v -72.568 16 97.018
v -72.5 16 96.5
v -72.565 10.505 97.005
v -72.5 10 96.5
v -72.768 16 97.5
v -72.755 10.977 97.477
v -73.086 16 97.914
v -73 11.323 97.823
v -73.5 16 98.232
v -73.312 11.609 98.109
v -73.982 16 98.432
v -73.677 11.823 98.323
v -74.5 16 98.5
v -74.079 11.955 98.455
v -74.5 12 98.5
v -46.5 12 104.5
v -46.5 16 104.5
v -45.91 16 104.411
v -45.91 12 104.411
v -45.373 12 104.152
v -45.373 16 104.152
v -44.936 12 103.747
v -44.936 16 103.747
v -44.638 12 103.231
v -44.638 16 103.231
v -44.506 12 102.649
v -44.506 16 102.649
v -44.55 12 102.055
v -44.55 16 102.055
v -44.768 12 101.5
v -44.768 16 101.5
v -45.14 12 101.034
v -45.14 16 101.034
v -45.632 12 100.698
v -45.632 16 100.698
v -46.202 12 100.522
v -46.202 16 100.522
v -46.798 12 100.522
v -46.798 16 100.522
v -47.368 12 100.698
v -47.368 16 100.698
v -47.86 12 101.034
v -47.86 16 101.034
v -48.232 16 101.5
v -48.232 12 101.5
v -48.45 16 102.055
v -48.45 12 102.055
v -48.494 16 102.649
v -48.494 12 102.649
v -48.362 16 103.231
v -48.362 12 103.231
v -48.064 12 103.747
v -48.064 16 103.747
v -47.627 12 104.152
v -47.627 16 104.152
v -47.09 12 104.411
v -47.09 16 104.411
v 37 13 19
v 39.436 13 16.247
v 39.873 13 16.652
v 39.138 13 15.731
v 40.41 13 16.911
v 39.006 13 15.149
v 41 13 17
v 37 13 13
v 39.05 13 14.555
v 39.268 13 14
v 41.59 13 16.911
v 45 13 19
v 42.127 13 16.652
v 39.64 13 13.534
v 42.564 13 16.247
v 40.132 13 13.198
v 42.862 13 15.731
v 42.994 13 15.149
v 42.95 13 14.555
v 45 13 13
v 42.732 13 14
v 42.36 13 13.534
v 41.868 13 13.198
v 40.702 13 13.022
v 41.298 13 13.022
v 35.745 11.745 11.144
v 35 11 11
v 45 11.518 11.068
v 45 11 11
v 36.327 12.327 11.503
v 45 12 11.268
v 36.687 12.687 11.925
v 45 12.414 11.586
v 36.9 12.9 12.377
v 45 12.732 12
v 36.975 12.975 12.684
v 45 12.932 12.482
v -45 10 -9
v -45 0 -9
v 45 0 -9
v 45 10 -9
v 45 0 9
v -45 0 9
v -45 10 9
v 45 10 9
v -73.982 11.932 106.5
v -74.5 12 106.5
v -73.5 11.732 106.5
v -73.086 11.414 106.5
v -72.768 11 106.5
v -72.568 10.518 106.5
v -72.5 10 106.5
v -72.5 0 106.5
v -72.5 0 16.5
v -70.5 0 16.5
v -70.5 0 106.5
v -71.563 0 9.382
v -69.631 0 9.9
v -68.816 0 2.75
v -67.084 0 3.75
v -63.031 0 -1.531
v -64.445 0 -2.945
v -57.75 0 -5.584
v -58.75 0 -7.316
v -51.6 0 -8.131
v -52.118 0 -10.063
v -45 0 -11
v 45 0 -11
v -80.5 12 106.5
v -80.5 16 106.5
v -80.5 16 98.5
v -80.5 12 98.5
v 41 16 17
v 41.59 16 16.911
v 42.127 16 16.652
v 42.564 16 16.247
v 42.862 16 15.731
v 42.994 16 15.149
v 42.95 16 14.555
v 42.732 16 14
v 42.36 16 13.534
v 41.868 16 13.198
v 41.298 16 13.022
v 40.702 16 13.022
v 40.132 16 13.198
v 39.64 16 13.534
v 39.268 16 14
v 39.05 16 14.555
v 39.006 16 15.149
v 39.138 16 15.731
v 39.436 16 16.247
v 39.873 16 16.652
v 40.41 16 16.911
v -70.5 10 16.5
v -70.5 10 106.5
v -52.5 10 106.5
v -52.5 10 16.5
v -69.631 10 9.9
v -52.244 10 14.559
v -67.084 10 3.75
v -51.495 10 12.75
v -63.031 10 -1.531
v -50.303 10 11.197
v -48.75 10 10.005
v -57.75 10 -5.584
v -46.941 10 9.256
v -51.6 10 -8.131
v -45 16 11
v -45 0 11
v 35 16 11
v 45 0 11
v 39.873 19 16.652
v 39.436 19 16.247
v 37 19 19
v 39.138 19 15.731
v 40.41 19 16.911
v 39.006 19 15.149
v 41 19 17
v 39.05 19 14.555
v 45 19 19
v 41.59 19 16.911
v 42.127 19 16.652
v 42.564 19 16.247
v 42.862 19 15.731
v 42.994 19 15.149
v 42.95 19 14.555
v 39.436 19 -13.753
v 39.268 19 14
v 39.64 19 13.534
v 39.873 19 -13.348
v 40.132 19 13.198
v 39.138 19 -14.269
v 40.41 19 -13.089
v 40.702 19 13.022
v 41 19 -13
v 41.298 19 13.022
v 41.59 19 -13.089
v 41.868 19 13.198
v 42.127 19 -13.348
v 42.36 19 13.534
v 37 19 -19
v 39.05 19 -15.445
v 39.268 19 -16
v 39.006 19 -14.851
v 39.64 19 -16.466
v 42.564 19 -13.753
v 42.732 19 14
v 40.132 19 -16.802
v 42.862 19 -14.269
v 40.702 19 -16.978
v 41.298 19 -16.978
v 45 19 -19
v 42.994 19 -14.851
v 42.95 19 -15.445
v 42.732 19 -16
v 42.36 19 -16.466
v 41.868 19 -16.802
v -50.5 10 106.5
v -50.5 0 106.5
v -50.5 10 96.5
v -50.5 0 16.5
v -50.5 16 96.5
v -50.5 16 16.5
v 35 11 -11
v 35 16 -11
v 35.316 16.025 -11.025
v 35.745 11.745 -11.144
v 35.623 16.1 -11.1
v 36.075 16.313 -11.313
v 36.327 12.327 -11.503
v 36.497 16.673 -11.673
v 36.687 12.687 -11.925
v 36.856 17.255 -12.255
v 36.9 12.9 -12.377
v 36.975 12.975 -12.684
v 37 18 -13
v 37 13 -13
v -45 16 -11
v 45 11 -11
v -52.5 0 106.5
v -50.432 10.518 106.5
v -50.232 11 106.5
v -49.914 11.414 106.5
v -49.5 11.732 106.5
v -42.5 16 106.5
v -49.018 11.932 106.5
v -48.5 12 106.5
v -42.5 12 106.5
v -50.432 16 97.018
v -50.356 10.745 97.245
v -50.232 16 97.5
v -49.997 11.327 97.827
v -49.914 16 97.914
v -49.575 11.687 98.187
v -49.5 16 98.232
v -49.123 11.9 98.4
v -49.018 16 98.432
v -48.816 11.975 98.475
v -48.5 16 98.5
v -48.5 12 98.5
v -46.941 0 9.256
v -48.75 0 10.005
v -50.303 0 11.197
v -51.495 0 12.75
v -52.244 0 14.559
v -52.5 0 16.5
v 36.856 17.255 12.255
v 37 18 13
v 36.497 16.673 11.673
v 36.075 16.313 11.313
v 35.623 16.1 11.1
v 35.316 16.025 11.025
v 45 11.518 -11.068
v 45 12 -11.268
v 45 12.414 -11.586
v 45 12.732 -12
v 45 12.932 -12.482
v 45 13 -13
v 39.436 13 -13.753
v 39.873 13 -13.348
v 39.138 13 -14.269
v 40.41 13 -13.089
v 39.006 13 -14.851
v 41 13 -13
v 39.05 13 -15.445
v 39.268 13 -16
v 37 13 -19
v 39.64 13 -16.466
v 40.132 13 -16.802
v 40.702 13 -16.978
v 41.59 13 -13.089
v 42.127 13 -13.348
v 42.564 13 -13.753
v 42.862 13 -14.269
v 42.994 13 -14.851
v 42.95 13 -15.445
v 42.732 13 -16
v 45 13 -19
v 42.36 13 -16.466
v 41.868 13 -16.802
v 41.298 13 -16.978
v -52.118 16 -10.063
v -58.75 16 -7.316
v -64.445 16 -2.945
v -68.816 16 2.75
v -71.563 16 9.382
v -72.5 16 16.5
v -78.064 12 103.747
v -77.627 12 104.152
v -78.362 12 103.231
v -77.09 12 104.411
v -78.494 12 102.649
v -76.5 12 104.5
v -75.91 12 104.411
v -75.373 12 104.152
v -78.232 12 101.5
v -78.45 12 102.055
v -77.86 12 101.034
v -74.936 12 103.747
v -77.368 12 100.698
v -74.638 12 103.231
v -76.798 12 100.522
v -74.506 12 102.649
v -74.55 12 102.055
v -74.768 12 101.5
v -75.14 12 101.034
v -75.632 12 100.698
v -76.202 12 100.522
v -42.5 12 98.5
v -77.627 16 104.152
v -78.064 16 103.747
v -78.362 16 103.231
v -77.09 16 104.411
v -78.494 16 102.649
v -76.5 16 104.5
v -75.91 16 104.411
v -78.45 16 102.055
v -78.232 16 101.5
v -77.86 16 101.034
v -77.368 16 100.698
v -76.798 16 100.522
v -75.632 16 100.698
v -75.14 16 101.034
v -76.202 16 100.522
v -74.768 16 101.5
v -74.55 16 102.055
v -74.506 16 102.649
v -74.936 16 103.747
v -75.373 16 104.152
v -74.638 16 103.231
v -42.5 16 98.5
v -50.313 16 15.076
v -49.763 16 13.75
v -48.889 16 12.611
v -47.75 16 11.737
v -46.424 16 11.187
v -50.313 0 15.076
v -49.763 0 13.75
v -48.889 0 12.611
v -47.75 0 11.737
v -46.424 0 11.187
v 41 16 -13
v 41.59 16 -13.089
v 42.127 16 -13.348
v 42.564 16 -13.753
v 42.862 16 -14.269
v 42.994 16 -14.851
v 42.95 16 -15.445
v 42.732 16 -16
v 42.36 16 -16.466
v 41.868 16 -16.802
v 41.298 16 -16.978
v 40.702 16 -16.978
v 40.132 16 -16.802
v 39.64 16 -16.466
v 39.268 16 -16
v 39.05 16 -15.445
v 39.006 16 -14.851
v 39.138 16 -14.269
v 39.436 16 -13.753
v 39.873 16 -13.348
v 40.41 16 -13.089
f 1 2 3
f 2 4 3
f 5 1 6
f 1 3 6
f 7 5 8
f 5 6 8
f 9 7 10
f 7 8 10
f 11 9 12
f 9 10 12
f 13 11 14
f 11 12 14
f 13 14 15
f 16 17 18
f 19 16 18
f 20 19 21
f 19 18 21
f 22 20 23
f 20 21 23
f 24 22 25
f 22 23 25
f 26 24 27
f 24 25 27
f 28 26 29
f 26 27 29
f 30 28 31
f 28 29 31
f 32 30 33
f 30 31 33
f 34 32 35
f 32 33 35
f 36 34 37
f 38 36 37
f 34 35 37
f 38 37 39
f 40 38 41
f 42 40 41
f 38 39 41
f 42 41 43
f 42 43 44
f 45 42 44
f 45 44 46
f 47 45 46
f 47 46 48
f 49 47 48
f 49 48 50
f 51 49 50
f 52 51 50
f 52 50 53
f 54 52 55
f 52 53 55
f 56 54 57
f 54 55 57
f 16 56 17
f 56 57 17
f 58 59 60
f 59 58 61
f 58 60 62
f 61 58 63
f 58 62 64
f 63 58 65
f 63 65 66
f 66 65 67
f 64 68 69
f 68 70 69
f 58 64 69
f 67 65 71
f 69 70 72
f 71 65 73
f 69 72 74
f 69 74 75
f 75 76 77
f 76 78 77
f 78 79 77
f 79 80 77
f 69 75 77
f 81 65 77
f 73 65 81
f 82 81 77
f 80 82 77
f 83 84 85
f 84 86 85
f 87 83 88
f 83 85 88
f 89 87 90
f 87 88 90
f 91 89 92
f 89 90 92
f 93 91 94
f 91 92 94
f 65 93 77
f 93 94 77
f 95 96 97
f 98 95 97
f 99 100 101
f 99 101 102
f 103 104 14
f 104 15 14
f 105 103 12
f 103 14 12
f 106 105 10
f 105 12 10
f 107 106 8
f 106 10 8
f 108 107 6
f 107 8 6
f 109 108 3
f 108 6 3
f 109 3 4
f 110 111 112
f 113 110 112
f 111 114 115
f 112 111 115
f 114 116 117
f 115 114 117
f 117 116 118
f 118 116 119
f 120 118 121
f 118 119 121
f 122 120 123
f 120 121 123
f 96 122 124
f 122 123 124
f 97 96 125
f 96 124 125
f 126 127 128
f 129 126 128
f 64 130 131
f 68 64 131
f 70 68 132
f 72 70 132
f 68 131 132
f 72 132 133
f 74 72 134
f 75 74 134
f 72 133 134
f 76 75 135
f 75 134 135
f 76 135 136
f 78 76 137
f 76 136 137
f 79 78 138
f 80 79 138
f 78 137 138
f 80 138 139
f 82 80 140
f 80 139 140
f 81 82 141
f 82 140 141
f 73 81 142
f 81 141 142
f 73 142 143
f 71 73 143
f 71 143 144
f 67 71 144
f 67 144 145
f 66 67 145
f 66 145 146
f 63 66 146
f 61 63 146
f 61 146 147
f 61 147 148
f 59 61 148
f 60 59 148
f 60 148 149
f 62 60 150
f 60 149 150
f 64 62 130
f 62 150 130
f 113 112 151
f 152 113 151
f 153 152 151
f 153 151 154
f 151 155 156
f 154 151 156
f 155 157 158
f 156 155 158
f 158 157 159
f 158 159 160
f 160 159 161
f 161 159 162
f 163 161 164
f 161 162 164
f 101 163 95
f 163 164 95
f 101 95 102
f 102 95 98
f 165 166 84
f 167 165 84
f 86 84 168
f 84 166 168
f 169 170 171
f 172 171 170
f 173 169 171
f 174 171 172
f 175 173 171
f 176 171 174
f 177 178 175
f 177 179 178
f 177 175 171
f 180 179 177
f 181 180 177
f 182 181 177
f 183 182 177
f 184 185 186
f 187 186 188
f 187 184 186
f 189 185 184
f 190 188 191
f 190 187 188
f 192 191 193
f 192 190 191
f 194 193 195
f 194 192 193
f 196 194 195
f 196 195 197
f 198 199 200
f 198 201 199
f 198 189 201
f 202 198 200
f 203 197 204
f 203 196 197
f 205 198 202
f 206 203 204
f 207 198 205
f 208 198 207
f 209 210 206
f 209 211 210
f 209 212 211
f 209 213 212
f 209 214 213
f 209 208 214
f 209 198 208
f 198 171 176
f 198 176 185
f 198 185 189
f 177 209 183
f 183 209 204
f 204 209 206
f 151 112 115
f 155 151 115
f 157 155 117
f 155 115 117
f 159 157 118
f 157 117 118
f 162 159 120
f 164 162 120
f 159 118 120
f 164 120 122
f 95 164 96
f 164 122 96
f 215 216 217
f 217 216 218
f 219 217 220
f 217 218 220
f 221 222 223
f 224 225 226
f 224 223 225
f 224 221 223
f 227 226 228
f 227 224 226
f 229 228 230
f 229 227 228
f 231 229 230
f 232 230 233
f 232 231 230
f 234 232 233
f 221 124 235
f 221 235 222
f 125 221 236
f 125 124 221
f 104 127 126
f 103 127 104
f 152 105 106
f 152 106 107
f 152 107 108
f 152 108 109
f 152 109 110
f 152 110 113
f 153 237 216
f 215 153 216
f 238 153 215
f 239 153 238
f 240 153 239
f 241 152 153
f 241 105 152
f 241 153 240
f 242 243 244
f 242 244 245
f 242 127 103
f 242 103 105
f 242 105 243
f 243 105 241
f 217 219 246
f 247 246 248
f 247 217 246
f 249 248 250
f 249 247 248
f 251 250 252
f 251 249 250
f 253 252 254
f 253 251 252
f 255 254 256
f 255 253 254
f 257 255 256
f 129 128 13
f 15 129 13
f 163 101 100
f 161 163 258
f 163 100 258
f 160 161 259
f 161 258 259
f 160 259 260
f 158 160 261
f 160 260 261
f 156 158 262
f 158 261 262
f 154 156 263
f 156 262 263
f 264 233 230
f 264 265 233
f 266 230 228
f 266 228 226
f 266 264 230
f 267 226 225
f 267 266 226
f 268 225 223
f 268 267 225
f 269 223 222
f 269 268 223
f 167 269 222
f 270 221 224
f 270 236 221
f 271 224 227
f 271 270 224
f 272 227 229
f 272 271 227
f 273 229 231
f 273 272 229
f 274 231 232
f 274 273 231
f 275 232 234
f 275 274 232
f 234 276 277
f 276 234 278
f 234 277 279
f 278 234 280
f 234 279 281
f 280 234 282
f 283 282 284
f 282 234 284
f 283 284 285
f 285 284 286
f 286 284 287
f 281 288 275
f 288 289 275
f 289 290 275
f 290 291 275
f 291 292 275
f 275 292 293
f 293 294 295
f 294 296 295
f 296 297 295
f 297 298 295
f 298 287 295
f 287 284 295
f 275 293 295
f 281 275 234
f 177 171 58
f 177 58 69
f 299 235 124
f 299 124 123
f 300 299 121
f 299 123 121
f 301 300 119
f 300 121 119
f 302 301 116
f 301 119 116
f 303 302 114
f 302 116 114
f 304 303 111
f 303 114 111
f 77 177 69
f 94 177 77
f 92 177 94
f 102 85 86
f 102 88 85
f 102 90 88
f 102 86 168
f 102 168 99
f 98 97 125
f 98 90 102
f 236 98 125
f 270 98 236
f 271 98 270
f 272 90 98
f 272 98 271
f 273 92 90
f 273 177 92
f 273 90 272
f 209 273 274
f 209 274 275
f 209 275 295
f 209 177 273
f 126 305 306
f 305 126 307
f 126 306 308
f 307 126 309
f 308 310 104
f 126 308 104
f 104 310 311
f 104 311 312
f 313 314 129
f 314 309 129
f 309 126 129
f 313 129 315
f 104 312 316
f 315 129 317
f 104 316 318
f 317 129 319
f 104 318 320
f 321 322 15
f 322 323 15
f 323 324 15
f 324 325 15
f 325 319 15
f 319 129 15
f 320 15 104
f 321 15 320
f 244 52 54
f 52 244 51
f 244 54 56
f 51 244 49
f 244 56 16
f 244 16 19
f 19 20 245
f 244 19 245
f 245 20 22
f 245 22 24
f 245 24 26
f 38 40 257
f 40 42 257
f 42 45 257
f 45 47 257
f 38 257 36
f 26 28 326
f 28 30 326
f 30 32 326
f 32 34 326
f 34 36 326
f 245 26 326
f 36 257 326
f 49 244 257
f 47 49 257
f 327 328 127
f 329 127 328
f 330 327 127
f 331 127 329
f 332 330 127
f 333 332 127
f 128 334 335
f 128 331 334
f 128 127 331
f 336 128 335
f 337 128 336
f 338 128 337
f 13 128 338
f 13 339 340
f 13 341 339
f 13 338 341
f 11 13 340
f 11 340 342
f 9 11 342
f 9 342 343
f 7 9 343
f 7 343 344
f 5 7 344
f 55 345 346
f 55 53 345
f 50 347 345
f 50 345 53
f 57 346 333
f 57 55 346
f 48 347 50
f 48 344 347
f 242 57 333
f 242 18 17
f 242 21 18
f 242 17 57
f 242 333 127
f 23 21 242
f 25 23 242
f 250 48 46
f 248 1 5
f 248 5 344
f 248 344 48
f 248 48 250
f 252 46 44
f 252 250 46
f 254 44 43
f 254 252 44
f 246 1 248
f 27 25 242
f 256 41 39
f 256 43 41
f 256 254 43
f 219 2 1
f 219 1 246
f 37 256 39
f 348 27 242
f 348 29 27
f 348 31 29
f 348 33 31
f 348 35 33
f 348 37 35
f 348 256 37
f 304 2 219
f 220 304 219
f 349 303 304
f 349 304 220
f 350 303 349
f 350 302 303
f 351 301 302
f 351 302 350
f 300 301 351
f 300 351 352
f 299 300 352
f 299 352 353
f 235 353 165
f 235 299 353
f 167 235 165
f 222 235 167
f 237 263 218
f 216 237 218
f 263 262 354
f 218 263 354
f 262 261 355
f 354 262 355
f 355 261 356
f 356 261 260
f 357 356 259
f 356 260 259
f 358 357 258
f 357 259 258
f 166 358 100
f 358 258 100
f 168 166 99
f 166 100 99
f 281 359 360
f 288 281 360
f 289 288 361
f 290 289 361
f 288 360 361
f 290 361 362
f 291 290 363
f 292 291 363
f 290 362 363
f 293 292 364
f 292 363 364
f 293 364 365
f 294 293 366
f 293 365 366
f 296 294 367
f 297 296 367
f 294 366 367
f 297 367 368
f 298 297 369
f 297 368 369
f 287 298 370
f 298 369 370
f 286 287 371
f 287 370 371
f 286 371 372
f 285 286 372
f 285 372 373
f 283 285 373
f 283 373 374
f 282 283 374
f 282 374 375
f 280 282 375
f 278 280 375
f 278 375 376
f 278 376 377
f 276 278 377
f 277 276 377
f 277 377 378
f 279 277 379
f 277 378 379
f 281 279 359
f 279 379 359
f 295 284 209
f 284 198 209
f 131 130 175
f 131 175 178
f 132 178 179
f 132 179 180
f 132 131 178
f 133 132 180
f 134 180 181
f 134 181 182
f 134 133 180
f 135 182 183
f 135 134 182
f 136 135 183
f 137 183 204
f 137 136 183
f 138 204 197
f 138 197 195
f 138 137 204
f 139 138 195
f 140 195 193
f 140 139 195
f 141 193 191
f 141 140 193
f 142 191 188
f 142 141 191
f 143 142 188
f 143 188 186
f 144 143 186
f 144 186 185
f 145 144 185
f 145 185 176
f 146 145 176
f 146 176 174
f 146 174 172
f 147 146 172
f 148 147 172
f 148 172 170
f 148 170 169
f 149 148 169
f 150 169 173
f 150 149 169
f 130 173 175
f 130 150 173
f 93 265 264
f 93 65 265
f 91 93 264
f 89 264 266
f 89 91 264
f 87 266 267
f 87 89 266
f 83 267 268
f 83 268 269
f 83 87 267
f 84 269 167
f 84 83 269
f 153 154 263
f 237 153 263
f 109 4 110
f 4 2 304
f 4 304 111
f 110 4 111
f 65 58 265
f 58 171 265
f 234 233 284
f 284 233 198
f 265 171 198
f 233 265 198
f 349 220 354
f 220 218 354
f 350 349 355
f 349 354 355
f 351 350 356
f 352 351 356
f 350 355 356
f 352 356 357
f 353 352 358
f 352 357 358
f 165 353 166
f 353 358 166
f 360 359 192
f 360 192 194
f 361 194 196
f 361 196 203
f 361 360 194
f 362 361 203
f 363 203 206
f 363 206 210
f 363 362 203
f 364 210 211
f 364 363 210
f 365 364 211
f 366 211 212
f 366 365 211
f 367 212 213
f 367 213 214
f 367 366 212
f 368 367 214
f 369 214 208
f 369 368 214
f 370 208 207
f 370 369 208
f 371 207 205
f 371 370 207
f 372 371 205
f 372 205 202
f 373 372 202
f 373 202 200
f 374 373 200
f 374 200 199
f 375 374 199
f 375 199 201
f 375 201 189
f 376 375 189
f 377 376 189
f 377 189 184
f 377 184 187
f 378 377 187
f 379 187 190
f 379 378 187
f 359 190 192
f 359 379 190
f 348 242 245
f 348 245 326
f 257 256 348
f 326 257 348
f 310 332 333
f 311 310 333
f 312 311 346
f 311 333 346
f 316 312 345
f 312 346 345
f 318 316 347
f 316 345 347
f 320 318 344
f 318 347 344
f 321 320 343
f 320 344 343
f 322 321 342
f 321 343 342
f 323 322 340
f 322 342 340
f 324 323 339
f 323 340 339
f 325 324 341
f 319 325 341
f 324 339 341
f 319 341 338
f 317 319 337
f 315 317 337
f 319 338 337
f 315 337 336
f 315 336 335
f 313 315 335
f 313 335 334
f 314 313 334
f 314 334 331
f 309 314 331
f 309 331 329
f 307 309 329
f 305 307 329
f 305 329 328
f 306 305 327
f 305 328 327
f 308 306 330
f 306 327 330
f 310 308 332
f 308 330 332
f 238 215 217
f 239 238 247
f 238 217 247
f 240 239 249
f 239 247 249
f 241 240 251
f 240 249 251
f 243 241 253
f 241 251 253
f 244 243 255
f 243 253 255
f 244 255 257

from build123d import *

# Parameters (mm, degrees)
SKETCH1_W           = 90
SKETCH1_H           = 22
BOSS_EXTRUDE1_DEPTH = 16
SKETCH2_W           = 119.5
SKETCH2_H           = 18
CUT_EXTRUDE1_DEPTH  = 10
SWEEP5_START        = 10
SWEEP5_DEPTH        = 6
SWEEP5_2_DEPTH      = 10
BOSS_EXTRUDE2_DEPTH = 90
SKETCH12_W          = 8
SKETCH12_H          = 11
SKETCH12_H_2        = 8
SKETCH12_R          = 2
BOSS_EXTRUDE3_DEPTH = 3
SKETCH14_W          = 8
SKETCH14_H          = 8
SKETCH14_R          = 2
SKETCH14_W_2        = 11
BOSS_EXTRUDE4_DEPTH = 4
FILLET1_R           = 2


# Read off the part's stored shape, not the designer's step: Sweep5
with BuildPart() as part:
    # Sketch1 → Boss-Extrude1 (new body)
    with BuildSketch(Plane(origin=(0, 0, 0), x_dir=(1, 0, 0), z_dir=(0, 1, 0))):
        Rectangle(SKETCH1_W, SKETCH1_H)
    extrude(amount=BOSS_EXTRUDE1_DEPTH)

    # Sketch2 → Cut-Extrude1 (cut)
    with BuildSketch(Plane.XZ):
        Rectangle(SKETCH2_W, SKETCH2_H)
    extrude(amount=-CUT_EXTRUDE1_DEPTH, mode=Mode.SUBTRACT)

    # Sweep5 outline → Sweep5 (add)
    with BuildSketch(Plane(origin=(0, 0, 0), x_dir=(1, 0, 0), z_dir=(0, 1, 0)).offset(SWEEP5_START)):
        with BuildLine():
            ThreePointArc((-45, 11), (-64.445436483, 2.945436483), (-72.5, -16.5))
            Line((-72.5, -16.5), (-50.5, -16.5))
            ThreePointArc((-50.5, -16.5), (-48.889087297, -12.610912703), (-45, -11))
            Line((-45, -11), (-45, 11))
        make_face()
    extrude(amount=SWEEP5_DEPTH)

    # Sweep5 2 outline → Sweep5 2 (add)
    with BuildSketch(Plane(origin=(0, 0, 0), x_dir=(1, 0, 0), z_dir=(0, 1, 0))):
        with BuildLine():
            ThreePointArc((-45, 11), (-64.445436483, 2.945436483), (-72.5, -16.5))
            Line((-72.5, -16.5), (-70.5, -16.5))
            ThreePointArc((-70.5, -16.5), (-63.03122292, 1.53122292), (-45, 9))
            Line((-45, 9), (-45, 11))
        make_face()
        with BuildLine():
            ThreePointArc((-45, -9), (-50.303300859, -11.196699141), (-52.5, -16.5))
            Line((-52.5, -16.5), (-50.5, -16.5))
            ThreePointArc((-50.5, -16.5), (-48.889087297, -12.610912703), (-45, -11))
            Line((-45, -11), (-45, -9))
        make_face()
    extrude(amount=SWEEP5_2_DEPTH)

    # Sketch11 → Boss-Extrude2 (add)
    with BuildSketch(Plane.XY.offset(16.5)):
        Polygon((-72.5, 16), (-72.5, 0), (-70.5, 0), (-70.5, 10), (-52.5, 10), (-52.5, 0), (-50.5, 0), (-50.5, 16), align=None)
    extrude(amount=BOSS_EXTRUDE2_DEPTH)

    # Sketch12 → Boss-Extrude3 (add, symmetric)
    # profile 1 of 4: a face of its own
    with BuildSketch(Plane(origin=(0, 16, 0), x_dir=(1, 0, 0), z_dir=(0, 1, 0))):
        with Locations((41, 5.5)):
            Rectangle(SKETCH12_W, SKETCH12_H)
    # profile 2 of 4: a face of its own
    with BuildSketch(Plane(origin=(0, 16, 0), x_dir=(1, 0, 0), z_dir=(0, 1, 0))):
        with Locations((41, -5.5)):
            Rectangle(SKETCH12_W, SKETCH12_H)
    # profile 3 of 4: a face of its own
    with BuildSketch(Plane(origin=(0, 16, 0), x_dir=(1, 0, 0), z_dir=(0, 1, 0))):
        with Locations((41, -15)):
            Rectangle(SKETCH12_W, SKETCH12_H_2)
        with Locations(Location((41, -15, 0), (0, 0, 270))):
            Circle(SKETCH12_R, mode=Mode.SUBTRACT)
    # profile 4 of 4: a face of its own
    with BuildSketch(Plane(origin=(0, 16, 0), x_dir=(1, 0, 0), z_dir=(0, 1, 0))):
        with Locations((41, 15)):
            Rectangle(SKETCH12_W, SKETCH12_H_2)
        with Locations(Location((41, 15, 0), (0, 0, 270))):
            Circle(SKETCH12_R, mode=Mode.SUBTRACT)
    extrude(amount=BOSS_EXTRUDE3_DEPTH, both=True)

    # Sketch14 → Boss-Extrude4 (add)
    # profile 1 of 4: a face of its own
    with BuildSketch(Plane(origin=(0, 16, 0), x_dir=(1, 0, 0), z_dir=(0, 1, 0))):
        with Locations((-76.5, -102.5)):
            Rectangle(SKETCH14_W, SKETCH14_H)
        with Locations(Location((-76.5, -102.5, 0), (0, 0, 270))):
            Circle(SKETCH14_R, mode=Mode.SUBTRACT)
    # profile 2 of 4: a face of its own
    with BuildSketch(Plane(origin=(0, 16, 0), x_dir=(1, 0, 0), z_dir=(0, 1, 0))):
        with Locations((-67, -102.5)):
            Rectangle(SKETCH14_W_2, SKETCH14_H)
    # profile 3 of 4: a face of its own
    with BuildSketch(Plane(origin=(0, 16, 0), x_dir=(1, 0, 0), z_dir=(0, 1, 0))):
        with Locations((-56, -102.5)):
            Rectangle(SKETCH14_W_2, SKETCH14_H)
    # profile 4 of 4: a face of its own
    with BuildSketch(Plane(origin=(0, 16, 0), x_dir=(1, 0, 0), z_dir=(0, 1, 0))):
        with Locations((-46.5, -102.5)):
            Rectangle(SKETCH14_W, SKETCH14_H)
        with Locations(Location((-46.5, -102.5, 0), (0, 0, 270))):
            Circle(SKETCH14_R, mode=Mode.SUBTRACT)
    extrude(amount=-BOSS_EXTRUDE4_DEPTH)

    # Fillet1
    fillet1_edges = [part.edges().sort_by_distance(p)[0] for p in [
        (-50.5, 14, 98.5),
        (-72.5, 12, 102.5),
        (-50.5, 12, 102.5),
        (-72.5, 14, 98.5),
        (37, 16, 0),
        (41, 13, 11),
        (41, 13, -11),
        (37, 14.5, -11),
        (37, 14.5, 11),
    ]]
    fillet(fillet1_edges, radius=FILLET1_R - 0.0001)  # a hair under: the kernel refuses the full size


solid = part.part
